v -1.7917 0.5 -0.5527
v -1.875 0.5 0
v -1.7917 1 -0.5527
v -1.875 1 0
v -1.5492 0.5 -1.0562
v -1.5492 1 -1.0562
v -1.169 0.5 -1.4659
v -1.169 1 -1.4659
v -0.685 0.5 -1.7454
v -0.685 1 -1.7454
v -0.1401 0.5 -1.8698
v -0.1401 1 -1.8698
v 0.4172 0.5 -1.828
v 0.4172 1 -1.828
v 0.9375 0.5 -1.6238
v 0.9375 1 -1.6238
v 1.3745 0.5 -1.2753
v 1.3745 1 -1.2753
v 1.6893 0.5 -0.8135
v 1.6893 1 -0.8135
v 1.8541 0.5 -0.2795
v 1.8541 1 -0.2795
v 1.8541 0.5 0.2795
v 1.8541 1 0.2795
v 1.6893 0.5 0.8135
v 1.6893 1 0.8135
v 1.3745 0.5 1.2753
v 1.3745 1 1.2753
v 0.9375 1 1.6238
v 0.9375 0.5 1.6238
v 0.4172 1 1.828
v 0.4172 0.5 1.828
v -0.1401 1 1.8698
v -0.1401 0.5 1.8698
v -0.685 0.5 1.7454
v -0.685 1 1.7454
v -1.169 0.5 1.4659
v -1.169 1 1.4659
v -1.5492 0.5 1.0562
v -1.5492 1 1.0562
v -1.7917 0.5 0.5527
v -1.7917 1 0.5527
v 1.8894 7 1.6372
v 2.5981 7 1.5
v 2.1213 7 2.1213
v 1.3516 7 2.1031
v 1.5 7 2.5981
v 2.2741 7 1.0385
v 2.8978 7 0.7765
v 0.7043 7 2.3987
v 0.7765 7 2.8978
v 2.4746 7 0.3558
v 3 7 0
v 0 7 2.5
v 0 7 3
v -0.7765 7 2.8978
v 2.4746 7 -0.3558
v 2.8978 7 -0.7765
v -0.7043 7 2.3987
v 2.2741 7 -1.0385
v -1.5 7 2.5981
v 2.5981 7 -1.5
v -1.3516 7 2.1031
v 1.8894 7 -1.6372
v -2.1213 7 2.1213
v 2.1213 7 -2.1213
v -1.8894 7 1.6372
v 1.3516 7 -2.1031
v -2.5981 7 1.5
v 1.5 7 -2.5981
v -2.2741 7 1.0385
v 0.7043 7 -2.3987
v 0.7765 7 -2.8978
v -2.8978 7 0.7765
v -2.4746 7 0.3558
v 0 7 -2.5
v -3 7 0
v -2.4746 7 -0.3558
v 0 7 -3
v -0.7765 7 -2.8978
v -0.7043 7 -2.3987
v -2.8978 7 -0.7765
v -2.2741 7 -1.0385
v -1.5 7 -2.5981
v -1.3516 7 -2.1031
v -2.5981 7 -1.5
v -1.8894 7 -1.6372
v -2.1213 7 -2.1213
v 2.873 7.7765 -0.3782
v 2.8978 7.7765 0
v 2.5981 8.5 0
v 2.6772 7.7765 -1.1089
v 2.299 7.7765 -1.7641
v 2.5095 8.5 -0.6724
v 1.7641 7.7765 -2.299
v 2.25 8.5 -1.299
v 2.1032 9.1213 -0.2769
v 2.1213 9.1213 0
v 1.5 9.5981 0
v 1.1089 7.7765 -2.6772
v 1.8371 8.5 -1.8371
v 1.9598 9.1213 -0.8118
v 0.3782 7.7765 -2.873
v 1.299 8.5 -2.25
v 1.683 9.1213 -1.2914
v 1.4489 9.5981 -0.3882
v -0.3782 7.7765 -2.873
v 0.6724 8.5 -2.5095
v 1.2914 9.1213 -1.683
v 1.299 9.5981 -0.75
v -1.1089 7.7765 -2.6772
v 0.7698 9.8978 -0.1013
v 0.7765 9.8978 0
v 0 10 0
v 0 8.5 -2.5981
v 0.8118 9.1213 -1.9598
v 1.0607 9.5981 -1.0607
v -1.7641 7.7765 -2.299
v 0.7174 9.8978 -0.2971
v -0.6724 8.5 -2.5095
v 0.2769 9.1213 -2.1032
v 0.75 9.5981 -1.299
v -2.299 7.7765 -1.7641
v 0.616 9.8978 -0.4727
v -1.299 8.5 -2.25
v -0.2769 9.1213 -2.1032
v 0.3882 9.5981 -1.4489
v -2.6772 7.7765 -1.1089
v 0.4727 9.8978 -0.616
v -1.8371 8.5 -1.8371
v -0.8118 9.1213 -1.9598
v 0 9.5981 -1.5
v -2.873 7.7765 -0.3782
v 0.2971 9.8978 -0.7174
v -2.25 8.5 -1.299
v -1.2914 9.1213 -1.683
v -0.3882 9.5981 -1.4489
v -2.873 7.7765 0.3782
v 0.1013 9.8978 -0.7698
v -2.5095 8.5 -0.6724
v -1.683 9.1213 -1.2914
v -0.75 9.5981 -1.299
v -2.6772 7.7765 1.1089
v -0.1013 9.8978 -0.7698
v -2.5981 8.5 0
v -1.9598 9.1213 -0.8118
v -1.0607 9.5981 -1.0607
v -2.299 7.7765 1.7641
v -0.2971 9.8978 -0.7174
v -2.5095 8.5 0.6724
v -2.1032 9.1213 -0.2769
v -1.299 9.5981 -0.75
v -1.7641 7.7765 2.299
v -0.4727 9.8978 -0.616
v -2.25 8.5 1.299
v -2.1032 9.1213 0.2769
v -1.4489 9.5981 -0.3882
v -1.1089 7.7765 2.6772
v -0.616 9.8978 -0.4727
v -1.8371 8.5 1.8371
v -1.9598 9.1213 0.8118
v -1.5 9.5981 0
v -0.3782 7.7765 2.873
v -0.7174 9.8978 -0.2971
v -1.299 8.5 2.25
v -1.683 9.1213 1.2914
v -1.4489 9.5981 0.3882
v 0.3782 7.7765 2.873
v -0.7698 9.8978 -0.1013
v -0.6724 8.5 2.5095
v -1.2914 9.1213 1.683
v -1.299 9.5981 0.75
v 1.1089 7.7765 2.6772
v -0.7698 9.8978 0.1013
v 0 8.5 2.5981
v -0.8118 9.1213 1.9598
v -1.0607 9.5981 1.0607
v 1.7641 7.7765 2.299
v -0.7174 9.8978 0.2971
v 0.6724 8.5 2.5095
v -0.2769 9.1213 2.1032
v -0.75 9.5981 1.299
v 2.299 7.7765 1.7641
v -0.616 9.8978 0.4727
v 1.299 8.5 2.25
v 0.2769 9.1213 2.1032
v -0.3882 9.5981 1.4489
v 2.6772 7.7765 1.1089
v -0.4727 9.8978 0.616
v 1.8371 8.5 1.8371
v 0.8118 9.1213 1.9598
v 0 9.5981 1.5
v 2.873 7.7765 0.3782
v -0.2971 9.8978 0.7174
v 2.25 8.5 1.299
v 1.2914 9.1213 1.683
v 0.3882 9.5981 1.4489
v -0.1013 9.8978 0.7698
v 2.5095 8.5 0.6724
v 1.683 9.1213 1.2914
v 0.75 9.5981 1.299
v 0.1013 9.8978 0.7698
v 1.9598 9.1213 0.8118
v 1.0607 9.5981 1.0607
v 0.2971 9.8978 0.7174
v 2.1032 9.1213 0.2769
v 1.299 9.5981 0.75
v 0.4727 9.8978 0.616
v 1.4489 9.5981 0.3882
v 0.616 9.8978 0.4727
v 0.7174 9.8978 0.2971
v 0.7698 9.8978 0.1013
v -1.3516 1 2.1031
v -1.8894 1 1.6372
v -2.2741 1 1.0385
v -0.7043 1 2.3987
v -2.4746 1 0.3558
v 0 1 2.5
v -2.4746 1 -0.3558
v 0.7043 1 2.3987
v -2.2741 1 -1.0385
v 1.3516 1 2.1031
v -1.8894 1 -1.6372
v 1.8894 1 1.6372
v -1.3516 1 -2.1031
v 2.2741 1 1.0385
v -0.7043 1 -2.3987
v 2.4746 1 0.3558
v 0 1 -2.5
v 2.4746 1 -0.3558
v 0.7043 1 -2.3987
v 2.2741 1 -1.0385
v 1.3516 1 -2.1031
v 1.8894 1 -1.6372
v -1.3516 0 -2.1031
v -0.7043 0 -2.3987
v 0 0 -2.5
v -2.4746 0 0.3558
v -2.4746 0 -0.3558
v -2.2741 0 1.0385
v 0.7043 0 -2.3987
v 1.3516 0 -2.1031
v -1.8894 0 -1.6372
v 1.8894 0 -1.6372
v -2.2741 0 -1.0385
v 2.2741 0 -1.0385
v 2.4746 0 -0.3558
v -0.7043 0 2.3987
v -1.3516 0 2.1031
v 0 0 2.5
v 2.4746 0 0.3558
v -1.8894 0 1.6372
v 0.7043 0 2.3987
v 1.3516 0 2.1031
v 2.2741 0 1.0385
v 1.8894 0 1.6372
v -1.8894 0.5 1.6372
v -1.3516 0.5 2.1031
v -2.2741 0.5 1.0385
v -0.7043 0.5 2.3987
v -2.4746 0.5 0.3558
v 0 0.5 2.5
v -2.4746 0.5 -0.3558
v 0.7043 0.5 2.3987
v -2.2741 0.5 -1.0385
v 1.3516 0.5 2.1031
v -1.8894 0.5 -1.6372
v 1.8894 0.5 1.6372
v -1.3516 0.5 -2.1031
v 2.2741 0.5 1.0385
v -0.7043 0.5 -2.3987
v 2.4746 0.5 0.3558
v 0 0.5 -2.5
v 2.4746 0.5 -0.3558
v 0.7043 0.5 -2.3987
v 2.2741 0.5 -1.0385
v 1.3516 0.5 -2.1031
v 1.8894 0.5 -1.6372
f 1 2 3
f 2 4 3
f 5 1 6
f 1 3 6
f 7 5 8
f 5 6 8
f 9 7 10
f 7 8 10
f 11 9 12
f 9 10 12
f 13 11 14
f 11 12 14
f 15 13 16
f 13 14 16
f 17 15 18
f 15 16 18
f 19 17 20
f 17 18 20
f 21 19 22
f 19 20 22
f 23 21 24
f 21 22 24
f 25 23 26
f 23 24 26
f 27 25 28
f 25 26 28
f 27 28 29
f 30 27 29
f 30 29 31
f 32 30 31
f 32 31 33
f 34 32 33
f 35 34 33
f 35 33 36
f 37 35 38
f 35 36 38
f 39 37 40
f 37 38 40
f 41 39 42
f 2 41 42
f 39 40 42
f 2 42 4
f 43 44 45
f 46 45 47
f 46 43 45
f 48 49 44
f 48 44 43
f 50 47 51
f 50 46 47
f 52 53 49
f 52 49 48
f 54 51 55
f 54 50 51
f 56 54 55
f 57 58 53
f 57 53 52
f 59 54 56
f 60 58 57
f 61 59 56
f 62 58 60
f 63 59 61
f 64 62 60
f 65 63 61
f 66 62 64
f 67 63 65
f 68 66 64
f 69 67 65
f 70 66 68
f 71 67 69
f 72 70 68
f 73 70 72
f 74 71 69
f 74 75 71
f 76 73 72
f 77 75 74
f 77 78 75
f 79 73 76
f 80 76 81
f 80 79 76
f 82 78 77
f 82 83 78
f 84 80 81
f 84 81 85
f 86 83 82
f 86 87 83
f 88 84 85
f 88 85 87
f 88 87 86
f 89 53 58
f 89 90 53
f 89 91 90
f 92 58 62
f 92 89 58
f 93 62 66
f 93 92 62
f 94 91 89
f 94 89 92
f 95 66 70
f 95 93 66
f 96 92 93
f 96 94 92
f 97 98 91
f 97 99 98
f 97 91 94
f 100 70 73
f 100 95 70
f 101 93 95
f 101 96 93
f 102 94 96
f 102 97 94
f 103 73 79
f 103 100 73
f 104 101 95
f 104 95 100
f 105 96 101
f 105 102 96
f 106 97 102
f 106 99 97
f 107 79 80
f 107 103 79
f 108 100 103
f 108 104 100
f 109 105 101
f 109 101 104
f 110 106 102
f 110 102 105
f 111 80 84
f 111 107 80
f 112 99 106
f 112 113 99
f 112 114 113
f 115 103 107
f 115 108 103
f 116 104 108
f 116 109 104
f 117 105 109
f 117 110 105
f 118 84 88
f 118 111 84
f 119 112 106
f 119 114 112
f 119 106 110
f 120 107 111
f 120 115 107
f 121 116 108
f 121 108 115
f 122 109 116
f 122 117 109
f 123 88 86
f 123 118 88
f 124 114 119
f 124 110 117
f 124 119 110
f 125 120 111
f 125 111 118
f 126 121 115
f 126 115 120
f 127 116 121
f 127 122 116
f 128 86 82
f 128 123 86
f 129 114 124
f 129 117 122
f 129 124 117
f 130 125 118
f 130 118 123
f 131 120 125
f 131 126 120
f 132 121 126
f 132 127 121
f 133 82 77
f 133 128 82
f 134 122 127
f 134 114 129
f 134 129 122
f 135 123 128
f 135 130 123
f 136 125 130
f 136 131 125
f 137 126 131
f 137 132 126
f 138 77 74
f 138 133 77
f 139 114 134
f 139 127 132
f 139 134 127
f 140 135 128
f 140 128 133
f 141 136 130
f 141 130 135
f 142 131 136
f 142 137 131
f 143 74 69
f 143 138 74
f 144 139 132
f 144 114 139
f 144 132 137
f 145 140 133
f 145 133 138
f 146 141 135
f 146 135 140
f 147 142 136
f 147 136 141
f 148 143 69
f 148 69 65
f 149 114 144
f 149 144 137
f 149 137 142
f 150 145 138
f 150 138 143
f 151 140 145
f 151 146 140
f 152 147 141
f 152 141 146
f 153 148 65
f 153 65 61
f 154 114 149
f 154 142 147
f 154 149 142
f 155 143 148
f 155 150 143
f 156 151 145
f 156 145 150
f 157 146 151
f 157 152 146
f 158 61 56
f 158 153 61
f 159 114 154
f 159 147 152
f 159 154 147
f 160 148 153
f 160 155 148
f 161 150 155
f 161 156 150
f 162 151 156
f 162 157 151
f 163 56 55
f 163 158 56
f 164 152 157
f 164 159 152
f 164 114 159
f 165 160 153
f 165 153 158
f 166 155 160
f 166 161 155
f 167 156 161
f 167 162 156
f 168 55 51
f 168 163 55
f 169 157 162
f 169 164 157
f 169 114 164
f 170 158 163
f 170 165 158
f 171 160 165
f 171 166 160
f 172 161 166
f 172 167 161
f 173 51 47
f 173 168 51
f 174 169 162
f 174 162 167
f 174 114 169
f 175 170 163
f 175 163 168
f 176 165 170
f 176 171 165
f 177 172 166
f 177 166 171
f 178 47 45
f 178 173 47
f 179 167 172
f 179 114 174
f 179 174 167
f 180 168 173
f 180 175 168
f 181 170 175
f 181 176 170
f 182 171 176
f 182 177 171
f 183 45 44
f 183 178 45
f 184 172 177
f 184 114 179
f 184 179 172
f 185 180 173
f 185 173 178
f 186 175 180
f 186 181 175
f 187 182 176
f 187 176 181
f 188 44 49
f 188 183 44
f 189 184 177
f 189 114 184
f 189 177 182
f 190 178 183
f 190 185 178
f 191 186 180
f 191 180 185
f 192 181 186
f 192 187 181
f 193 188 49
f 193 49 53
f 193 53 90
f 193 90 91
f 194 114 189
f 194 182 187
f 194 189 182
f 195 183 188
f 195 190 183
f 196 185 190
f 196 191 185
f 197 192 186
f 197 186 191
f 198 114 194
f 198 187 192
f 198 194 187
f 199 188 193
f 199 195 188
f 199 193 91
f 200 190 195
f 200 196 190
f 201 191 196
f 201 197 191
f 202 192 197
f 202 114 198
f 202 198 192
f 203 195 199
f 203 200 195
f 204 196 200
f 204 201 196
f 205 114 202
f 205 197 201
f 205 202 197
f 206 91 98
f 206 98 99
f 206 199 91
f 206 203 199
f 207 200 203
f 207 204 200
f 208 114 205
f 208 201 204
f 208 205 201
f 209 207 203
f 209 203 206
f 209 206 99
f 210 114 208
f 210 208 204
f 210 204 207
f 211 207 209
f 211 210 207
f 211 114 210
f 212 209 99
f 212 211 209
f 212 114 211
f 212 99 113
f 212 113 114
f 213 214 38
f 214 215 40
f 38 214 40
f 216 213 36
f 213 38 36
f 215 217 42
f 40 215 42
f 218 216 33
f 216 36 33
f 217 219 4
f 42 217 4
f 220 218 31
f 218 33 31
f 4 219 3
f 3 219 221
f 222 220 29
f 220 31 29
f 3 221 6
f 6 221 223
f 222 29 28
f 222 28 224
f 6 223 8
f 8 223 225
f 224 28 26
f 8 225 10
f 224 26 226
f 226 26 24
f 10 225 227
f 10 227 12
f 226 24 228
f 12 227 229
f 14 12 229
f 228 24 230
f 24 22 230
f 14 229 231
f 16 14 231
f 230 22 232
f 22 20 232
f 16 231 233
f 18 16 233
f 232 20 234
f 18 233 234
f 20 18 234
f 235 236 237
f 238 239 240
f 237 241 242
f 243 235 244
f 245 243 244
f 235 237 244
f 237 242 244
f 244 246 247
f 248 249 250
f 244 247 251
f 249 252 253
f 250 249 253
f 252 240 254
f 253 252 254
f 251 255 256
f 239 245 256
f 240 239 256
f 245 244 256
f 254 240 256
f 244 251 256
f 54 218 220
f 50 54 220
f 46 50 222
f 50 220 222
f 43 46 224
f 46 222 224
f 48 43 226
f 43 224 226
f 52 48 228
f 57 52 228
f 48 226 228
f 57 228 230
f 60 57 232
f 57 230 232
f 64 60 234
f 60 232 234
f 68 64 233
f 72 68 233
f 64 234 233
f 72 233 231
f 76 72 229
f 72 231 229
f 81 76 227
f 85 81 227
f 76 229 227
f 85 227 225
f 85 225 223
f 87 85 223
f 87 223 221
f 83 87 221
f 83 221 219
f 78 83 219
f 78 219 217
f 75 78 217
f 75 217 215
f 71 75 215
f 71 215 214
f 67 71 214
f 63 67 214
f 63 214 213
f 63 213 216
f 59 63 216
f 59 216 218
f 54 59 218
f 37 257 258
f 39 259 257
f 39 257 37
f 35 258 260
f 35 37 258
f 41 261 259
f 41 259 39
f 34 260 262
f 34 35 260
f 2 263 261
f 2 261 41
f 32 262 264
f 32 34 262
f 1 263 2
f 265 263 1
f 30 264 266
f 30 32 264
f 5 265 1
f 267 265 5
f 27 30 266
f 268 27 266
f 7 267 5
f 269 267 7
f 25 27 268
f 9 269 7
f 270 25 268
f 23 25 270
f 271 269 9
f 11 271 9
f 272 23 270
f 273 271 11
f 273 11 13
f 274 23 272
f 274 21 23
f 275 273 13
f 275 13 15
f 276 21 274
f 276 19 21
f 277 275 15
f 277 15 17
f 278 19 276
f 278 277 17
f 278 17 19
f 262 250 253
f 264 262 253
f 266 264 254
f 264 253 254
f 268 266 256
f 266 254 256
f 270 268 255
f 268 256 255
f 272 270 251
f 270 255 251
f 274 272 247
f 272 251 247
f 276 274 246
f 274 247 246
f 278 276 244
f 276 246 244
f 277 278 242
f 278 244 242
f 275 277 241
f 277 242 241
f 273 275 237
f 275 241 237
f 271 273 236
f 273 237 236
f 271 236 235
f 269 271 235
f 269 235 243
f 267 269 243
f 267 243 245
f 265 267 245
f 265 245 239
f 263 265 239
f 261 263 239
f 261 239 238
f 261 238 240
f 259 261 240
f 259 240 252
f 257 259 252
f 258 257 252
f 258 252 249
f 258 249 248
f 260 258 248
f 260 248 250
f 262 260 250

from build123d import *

# Parameters (mm, degrees)
SKETCH1_R           = 2.5
BOSS_EXTRUDE1_DEPTH = 7
SKETCH3_W           = 0.625
SKETCH3_H           = 0.5


with BuildPart() as part:
    # Sketch1 → Boss-Extrude1 (new body)
    with BuildSketch(Plane(origin=(0, 0, 0), x_dir=(1, 0, 0), z_dir=(0, 1, 0))):
        with Locations(Location((0, 0, 0), (0, 0, 270))):
            Circle(SKETCH1_R)
    extrude(amount=BOSS_EXTRUDE1_DEPTH)

    # Sketch2 → Revolve1 (revolve)
    with BuildSketch(Plane.XY):
        with BuildLine():
            Line((0, 7), (3, 7))
            ThreePointArc((3, 7), (2.121320344, 9.121320344), (0, 10))
            Line((0, 10), (0, 7))
        make_face()
    revolve(axis=Axis((0, 7, 0), (0, 1, 0)))

    # Sketch3 → Cut-Revolve1 (revolve, cut)
    with BuildSketch(Plane.XY, mode=Mode.PRIVATE) as cut_revolve1_sk:
        with Locations((2.1875, 0.75)):
            Rectangle(SKETCH3_W, SKETCH3_H)
    revolve(cut_revolve1_sk.sketch.rotate(Axis((0, 7, 0), (0, -1, 0)), 180), axis=Axis((0, 7, 0), (0, -1, 0)), mode=Mode.SUBTRACT)


solid = part.part
